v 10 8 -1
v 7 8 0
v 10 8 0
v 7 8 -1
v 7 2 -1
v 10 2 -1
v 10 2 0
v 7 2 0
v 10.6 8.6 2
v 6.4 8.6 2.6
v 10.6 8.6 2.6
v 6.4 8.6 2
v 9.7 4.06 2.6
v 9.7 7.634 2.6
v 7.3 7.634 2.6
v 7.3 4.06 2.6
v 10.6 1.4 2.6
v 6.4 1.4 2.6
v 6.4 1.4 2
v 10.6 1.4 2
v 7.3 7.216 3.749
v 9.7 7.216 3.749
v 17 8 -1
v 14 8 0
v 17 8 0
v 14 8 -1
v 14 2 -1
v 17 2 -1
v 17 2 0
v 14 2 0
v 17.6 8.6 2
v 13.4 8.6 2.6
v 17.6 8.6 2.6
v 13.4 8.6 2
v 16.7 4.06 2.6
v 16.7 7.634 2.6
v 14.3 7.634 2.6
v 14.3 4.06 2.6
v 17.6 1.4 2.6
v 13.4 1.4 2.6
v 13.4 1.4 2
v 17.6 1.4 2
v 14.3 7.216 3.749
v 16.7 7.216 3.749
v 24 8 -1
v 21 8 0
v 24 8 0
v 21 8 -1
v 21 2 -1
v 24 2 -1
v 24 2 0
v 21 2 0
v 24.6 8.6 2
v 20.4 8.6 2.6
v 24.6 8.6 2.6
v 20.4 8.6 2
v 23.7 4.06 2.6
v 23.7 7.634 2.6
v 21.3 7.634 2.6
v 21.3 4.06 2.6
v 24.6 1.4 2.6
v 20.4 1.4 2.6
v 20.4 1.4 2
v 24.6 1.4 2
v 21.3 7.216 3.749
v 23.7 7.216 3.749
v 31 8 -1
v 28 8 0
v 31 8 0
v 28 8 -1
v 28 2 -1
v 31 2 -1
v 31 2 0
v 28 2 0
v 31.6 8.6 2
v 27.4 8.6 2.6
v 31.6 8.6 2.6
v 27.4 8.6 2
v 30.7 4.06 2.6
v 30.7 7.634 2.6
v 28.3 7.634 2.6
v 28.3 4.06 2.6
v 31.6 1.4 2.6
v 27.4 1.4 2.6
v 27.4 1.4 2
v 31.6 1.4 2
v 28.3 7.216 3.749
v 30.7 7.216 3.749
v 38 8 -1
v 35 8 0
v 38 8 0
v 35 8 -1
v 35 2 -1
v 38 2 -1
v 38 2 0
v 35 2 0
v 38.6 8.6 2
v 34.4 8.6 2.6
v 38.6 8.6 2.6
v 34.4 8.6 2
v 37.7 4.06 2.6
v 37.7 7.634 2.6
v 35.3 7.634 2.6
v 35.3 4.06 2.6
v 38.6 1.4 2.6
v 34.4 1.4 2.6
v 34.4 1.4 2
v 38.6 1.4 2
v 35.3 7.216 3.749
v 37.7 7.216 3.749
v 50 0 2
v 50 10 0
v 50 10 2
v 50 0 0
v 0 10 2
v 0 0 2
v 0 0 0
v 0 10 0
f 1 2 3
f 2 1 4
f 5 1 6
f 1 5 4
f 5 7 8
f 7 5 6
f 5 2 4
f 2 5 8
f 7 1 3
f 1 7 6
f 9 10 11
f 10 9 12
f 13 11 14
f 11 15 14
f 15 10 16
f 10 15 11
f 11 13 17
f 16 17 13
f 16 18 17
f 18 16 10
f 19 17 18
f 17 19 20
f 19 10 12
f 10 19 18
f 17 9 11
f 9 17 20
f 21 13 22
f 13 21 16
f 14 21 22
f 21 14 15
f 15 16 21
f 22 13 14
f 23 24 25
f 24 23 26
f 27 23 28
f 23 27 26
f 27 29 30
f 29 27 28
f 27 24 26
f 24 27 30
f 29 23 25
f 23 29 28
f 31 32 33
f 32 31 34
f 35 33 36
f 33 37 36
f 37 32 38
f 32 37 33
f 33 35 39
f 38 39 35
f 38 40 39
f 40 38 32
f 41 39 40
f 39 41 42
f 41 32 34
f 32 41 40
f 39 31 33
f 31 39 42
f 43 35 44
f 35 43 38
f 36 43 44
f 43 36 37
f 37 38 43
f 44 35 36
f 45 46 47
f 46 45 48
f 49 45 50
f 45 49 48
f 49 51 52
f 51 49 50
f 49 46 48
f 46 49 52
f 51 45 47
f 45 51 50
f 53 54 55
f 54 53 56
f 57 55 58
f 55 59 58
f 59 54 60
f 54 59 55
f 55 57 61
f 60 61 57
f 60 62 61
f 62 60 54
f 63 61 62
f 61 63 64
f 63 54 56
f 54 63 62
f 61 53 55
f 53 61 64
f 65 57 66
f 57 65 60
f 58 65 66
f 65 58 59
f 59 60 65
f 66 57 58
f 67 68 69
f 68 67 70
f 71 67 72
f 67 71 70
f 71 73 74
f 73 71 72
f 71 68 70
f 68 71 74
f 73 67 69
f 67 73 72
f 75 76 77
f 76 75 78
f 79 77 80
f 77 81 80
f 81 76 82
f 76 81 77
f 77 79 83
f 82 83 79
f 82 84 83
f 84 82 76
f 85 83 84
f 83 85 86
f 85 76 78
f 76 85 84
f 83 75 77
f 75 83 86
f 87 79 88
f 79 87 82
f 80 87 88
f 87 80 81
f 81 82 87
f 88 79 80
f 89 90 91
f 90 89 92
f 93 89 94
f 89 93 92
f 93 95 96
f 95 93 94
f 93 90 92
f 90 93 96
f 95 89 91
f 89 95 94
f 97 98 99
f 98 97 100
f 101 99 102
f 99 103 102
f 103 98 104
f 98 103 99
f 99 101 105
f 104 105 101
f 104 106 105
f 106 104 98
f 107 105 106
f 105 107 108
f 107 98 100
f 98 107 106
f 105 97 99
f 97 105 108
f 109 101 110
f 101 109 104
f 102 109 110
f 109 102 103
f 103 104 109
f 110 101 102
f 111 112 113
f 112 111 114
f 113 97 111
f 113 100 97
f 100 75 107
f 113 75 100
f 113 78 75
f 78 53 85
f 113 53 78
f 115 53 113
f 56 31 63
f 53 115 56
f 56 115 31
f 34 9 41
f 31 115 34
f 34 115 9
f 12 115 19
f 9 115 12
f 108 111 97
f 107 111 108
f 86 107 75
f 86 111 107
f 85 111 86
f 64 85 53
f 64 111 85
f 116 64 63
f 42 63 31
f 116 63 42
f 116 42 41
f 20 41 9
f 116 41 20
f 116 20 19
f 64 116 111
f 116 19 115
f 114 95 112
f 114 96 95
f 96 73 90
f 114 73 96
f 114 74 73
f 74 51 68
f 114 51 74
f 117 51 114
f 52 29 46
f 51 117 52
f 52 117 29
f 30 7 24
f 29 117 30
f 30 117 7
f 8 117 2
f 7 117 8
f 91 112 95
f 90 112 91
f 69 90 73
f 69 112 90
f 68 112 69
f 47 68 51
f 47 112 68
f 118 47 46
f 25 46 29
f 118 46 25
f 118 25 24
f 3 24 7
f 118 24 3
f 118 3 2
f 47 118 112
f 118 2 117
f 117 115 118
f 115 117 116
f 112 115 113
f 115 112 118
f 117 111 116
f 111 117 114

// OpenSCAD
// file: e_components/switch.scad
module switch_land(color){

	body_color = "DarkSlateGray";

	color(body_color)cube([20,10,10]);
	color(body_color)translate([-2,-2,10])	cube([24,14,2]);

	color(color)translate([5,1,6])rotate([0,-20,0])cube([15,8,5]);
//	translate([8,10,20])rotate([90,0,0])cylinder(10,10,10);
	
}
// main file
include <e_components/switch.scad>

module switch_holder(wood_color){

	s_s = 0.3;

	s_z = -1;
	s_y = 2;
	s_x_start = 10;
	s_x_step = 7;
	s_x_count = 40;

	color(wood_color)cube([50,10,2]);

	for(s_x = [s_x_start:s_x_step:s_x_count]){
		translate([s_x, s_y,s_z])rotate([0,0,90])scale([s_s,s_s,s_s])switch_land("Red");
	}


}

switch_holder("BurlyWood");
